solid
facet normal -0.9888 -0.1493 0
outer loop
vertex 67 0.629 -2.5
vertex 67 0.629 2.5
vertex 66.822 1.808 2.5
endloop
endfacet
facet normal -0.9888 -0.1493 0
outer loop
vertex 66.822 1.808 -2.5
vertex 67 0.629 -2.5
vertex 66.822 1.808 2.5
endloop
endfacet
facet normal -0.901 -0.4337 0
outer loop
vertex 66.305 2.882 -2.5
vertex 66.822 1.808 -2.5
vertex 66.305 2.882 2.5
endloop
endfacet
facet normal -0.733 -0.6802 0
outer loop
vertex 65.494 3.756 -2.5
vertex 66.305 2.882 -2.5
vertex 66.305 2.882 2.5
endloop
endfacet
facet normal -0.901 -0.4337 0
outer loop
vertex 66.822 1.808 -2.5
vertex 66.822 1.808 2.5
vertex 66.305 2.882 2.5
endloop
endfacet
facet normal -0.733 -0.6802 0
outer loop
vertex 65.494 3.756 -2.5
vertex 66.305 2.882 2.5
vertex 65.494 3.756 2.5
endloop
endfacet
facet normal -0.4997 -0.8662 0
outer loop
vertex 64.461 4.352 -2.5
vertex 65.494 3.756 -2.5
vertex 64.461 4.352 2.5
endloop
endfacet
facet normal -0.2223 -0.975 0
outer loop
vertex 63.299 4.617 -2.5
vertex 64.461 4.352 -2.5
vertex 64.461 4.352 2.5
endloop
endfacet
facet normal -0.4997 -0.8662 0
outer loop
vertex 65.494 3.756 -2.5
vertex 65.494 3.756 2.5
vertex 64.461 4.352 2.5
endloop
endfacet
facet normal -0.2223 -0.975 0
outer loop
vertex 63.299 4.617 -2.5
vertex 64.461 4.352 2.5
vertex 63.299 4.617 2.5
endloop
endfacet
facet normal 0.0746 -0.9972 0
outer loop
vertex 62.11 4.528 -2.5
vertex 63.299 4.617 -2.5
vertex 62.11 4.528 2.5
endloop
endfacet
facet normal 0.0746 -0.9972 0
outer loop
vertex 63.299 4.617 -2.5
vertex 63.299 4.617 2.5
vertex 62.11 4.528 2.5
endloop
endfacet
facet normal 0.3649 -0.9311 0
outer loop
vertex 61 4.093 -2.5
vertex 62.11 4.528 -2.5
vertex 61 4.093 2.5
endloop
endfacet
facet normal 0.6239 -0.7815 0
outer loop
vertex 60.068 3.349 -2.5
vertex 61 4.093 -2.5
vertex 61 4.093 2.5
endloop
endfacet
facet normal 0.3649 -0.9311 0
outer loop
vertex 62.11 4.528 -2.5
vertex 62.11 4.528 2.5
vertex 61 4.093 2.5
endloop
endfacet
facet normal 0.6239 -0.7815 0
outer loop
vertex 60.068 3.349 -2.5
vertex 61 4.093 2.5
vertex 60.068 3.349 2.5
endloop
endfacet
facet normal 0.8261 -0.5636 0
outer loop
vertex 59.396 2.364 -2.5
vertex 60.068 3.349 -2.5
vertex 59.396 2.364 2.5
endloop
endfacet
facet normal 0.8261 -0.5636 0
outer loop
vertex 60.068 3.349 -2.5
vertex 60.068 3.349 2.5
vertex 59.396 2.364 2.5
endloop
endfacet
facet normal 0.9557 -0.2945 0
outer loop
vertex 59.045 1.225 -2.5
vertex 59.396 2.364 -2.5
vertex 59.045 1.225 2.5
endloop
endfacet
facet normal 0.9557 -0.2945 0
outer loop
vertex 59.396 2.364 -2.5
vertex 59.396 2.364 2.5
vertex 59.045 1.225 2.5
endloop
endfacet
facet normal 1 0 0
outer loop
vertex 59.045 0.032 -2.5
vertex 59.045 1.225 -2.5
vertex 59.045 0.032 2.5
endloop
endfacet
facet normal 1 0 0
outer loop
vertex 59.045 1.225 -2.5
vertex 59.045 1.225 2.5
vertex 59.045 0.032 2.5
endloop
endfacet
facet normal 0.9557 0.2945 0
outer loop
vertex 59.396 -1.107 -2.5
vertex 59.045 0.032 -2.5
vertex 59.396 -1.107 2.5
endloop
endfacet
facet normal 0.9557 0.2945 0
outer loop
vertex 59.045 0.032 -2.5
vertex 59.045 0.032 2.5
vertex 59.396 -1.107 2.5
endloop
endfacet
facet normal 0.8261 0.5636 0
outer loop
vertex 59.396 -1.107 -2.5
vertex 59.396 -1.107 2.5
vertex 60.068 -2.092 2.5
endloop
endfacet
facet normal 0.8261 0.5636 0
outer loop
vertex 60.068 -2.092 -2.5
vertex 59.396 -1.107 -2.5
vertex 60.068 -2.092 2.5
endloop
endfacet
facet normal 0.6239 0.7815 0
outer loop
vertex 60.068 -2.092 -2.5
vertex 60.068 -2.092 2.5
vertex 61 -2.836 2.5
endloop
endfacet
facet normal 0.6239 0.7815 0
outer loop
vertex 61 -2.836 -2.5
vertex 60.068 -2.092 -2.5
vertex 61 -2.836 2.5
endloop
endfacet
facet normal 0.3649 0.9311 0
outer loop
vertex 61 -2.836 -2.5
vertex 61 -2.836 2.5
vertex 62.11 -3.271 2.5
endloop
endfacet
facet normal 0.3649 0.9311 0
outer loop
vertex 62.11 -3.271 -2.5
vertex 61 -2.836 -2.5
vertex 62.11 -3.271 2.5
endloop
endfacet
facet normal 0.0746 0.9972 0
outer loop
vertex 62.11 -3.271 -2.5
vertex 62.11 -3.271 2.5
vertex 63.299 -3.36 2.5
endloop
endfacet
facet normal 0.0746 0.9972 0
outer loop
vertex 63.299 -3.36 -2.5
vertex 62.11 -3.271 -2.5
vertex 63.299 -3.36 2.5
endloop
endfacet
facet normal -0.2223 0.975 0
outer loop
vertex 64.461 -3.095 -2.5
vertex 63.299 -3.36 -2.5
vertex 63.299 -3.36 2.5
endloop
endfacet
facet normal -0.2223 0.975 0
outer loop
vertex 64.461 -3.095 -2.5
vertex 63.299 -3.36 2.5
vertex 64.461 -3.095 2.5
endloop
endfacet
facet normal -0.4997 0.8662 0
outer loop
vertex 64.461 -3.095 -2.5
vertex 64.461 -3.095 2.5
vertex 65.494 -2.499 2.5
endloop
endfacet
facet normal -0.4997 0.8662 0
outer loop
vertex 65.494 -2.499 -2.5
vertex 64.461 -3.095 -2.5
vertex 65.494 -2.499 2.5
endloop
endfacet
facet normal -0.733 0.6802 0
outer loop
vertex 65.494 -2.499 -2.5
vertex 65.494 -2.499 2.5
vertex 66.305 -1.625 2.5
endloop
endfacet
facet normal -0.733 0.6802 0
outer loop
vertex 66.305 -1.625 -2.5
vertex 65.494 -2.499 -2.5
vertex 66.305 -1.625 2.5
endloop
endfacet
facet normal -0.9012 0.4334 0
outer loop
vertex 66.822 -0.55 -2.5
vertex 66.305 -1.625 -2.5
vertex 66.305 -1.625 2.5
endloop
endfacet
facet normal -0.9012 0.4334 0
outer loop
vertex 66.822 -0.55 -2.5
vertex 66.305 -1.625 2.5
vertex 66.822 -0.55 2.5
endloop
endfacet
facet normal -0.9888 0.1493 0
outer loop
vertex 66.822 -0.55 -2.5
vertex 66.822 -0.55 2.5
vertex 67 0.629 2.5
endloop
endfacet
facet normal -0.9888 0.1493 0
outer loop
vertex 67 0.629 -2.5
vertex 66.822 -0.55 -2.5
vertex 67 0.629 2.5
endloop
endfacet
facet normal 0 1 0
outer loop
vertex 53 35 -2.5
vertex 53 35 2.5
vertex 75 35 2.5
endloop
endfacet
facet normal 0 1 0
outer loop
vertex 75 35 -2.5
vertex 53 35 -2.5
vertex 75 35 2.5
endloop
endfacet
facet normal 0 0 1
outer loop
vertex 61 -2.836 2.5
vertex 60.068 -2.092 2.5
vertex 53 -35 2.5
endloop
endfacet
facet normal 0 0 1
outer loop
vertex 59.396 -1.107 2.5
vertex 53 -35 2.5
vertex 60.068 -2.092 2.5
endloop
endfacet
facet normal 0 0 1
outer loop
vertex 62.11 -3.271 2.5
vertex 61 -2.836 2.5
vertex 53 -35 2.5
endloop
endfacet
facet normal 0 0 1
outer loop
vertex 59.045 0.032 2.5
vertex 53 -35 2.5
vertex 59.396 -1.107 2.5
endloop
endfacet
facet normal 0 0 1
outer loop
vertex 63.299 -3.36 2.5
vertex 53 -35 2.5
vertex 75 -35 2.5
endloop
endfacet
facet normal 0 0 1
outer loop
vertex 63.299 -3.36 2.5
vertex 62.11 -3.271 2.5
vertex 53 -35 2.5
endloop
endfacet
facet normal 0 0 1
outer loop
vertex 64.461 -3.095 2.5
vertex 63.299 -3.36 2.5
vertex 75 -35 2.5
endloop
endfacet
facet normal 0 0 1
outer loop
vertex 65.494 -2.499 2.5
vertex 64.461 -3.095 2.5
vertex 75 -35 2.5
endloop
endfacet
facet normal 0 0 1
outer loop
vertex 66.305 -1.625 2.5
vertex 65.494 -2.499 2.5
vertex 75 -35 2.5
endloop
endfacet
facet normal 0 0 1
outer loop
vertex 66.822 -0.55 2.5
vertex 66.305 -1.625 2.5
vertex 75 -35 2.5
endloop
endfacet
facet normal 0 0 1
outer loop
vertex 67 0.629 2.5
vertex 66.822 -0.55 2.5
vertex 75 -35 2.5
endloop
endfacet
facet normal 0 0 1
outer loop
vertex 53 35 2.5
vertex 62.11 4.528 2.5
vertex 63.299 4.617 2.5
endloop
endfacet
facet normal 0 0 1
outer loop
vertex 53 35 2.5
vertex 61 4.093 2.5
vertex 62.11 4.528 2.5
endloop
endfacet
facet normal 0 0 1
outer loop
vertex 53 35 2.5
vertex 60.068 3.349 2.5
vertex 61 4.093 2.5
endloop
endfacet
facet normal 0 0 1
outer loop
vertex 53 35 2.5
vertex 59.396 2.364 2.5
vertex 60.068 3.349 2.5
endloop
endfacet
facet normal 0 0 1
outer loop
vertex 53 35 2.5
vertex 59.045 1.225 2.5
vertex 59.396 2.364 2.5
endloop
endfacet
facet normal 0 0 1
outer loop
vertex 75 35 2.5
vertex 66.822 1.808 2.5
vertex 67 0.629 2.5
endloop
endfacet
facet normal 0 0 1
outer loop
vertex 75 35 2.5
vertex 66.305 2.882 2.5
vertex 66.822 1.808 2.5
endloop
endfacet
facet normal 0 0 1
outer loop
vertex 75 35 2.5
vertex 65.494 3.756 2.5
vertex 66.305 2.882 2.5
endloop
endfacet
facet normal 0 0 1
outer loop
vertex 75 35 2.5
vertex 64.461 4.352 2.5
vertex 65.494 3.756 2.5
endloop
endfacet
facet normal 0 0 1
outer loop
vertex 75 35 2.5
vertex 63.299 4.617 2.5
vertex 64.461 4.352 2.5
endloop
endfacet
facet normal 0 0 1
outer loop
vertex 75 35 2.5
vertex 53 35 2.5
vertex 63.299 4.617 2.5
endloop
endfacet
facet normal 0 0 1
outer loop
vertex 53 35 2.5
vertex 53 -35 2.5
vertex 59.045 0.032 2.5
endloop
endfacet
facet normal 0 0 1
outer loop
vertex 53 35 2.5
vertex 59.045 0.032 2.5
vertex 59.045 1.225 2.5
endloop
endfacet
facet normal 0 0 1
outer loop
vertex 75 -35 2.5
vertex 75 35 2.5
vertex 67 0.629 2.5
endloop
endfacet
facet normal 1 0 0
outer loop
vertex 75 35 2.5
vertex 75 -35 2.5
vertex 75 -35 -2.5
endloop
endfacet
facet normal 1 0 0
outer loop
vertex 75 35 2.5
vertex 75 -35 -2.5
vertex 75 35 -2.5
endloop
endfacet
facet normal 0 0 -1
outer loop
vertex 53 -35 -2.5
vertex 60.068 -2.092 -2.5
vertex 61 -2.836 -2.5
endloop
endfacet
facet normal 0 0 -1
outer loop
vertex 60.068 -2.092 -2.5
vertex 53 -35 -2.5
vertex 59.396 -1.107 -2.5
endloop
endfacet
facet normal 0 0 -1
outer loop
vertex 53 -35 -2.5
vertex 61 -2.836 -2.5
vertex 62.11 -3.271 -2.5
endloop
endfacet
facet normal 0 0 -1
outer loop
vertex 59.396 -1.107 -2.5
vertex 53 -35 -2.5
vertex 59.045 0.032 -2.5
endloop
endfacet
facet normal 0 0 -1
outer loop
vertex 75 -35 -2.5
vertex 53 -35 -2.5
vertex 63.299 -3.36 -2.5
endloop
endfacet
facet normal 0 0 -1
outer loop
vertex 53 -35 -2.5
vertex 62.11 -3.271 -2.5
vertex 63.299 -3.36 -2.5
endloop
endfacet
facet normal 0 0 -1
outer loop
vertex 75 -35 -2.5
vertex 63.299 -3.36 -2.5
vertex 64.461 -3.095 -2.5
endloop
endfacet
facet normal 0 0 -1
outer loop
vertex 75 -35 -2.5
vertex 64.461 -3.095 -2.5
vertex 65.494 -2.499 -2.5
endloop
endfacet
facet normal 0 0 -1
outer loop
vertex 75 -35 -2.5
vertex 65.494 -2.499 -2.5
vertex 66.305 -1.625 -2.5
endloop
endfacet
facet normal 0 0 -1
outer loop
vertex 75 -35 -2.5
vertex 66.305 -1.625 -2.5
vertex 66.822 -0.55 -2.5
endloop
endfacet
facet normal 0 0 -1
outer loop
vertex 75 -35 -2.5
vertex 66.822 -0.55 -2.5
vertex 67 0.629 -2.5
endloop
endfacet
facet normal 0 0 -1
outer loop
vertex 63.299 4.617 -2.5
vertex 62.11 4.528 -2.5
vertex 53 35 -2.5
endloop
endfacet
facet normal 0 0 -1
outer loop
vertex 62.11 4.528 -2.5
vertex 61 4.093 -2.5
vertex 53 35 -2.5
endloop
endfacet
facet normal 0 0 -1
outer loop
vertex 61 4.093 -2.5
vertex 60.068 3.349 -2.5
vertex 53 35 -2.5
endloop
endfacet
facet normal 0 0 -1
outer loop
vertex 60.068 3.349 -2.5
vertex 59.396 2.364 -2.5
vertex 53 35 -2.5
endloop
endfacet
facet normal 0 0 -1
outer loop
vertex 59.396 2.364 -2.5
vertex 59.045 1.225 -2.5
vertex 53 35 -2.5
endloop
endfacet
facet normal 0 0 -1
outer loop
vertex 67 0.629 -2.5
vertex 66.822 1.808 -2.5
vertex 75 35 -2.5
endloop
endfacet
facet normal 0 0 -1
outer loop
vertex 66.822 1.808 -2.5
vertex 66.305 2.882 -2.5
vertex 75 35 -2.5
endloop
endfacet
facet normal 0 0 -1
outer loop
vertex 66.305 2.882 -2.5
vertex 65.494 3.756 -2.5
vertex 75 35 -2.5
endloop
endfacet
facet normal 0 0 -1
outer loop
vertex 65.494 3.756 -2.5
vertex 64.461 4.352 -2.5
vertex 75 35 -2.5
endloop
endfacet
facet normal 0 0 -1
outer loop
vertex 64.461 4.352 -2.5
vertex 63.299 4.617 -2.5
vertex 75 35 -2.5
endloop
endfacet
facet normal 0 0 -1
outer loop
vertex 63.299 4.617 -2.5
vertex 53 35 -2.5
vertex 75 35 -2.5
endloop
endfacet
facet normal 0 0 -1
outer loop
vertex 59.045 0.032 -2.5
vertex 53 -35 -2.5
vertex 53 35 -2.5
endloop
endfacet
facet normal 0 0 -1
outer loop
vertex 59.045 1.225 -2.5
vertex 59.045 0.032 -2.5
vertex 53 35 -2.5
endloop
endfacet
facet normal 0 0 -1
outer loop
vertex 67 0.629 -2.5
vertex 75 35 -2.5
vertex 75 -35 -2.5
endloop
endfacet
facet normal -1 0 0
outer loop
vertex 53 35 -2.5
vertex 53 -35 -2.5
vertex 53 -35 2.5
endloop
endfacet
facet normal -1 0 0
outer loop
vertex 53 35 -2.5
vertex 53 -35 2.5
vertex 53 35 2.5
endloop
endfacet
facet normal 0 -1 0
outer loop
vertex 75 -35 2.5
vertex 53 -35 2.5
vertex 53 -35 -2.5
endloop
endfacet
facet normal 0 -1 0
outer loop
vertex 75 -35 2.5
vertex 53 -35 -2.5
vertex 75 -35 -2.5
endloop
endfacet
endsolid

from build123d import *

# Parameters (mm, degrees)
SKETCH1_W           = 150
SKETCH1_H           = 70
BOSS_EXTRUDE1_DEPTH = 2.5
SKETCH2_R           = 4
CUT_EXTRUDE1_DEPTH  = 6
SKETCH3_W           = 120
SKETCH3_H           = 70
CUT_EXTRUDE2_DEPTH  = 6
SKETCH4_W           = 8
SKETCH4_H           = 70
CUT_EXTRUDE3_DEPTH  = 6


with BuildPart() as part:
    # Sketch1 → Boss-Extrude1 (new body, symmetric)
    with BuildSketch(Plane.XY):
        Rectangle(SKETCH1_W, SKETCH1_H)
    extrude(amount=BOSS_EXTRUDE1_DEPTH, both=True)

    # Sketch2 → Cut-Extrude1 (cut, through all)
    with BuildSketch(Plane.XY.offset(2.5)):
        with Locations((63, 0.628549325)):
            Circle(SKETCH2_R)
        with Locations((29.001496193, 0.309583996)):
            Circle(SKETCH2_R)
        with Locations((-42.995335398, -0.365871995)):
            Circle(SKETCH2_R)
        with Locations((-3.99705162, 0)):
            Circle(SKETCH2_R)
    extrude(amount=-CUT_EXTRUDE1_DEPTH, mode=Mode.SUBTRACT)

    # Sketch3 → Cut-Extrude2 (cut, through all)
    with BuildSketch(Plane(origin=(0, 0, -2.5), x_dir=(-1, 0, 0), z_dir=(0, 0, -1))):
        with Locations((15, 0)):
            Rectangle(SKETCH3_W, SKETCH3_H)
    extrude(amount=-CUT_EXTRUDE2_DEPTH, mode=Mode.SUBTRACT)

    # Sketch4 → Cut-Extrude3 (cut, through all)
    with BuildSketch(Plane(origin=(0, 0, -2.5), x_dir=(-1, 0, 0), z_dir=(0, 0, -1))):
        with Locations((-49, 0)):
            Rectangle(SKETCH4_W, SKETCH4_H)
    extrude(amount=-CUT_EXTRUDE3_DEPTH, mode=Mode.SUBTRACT)


solid = part.part
